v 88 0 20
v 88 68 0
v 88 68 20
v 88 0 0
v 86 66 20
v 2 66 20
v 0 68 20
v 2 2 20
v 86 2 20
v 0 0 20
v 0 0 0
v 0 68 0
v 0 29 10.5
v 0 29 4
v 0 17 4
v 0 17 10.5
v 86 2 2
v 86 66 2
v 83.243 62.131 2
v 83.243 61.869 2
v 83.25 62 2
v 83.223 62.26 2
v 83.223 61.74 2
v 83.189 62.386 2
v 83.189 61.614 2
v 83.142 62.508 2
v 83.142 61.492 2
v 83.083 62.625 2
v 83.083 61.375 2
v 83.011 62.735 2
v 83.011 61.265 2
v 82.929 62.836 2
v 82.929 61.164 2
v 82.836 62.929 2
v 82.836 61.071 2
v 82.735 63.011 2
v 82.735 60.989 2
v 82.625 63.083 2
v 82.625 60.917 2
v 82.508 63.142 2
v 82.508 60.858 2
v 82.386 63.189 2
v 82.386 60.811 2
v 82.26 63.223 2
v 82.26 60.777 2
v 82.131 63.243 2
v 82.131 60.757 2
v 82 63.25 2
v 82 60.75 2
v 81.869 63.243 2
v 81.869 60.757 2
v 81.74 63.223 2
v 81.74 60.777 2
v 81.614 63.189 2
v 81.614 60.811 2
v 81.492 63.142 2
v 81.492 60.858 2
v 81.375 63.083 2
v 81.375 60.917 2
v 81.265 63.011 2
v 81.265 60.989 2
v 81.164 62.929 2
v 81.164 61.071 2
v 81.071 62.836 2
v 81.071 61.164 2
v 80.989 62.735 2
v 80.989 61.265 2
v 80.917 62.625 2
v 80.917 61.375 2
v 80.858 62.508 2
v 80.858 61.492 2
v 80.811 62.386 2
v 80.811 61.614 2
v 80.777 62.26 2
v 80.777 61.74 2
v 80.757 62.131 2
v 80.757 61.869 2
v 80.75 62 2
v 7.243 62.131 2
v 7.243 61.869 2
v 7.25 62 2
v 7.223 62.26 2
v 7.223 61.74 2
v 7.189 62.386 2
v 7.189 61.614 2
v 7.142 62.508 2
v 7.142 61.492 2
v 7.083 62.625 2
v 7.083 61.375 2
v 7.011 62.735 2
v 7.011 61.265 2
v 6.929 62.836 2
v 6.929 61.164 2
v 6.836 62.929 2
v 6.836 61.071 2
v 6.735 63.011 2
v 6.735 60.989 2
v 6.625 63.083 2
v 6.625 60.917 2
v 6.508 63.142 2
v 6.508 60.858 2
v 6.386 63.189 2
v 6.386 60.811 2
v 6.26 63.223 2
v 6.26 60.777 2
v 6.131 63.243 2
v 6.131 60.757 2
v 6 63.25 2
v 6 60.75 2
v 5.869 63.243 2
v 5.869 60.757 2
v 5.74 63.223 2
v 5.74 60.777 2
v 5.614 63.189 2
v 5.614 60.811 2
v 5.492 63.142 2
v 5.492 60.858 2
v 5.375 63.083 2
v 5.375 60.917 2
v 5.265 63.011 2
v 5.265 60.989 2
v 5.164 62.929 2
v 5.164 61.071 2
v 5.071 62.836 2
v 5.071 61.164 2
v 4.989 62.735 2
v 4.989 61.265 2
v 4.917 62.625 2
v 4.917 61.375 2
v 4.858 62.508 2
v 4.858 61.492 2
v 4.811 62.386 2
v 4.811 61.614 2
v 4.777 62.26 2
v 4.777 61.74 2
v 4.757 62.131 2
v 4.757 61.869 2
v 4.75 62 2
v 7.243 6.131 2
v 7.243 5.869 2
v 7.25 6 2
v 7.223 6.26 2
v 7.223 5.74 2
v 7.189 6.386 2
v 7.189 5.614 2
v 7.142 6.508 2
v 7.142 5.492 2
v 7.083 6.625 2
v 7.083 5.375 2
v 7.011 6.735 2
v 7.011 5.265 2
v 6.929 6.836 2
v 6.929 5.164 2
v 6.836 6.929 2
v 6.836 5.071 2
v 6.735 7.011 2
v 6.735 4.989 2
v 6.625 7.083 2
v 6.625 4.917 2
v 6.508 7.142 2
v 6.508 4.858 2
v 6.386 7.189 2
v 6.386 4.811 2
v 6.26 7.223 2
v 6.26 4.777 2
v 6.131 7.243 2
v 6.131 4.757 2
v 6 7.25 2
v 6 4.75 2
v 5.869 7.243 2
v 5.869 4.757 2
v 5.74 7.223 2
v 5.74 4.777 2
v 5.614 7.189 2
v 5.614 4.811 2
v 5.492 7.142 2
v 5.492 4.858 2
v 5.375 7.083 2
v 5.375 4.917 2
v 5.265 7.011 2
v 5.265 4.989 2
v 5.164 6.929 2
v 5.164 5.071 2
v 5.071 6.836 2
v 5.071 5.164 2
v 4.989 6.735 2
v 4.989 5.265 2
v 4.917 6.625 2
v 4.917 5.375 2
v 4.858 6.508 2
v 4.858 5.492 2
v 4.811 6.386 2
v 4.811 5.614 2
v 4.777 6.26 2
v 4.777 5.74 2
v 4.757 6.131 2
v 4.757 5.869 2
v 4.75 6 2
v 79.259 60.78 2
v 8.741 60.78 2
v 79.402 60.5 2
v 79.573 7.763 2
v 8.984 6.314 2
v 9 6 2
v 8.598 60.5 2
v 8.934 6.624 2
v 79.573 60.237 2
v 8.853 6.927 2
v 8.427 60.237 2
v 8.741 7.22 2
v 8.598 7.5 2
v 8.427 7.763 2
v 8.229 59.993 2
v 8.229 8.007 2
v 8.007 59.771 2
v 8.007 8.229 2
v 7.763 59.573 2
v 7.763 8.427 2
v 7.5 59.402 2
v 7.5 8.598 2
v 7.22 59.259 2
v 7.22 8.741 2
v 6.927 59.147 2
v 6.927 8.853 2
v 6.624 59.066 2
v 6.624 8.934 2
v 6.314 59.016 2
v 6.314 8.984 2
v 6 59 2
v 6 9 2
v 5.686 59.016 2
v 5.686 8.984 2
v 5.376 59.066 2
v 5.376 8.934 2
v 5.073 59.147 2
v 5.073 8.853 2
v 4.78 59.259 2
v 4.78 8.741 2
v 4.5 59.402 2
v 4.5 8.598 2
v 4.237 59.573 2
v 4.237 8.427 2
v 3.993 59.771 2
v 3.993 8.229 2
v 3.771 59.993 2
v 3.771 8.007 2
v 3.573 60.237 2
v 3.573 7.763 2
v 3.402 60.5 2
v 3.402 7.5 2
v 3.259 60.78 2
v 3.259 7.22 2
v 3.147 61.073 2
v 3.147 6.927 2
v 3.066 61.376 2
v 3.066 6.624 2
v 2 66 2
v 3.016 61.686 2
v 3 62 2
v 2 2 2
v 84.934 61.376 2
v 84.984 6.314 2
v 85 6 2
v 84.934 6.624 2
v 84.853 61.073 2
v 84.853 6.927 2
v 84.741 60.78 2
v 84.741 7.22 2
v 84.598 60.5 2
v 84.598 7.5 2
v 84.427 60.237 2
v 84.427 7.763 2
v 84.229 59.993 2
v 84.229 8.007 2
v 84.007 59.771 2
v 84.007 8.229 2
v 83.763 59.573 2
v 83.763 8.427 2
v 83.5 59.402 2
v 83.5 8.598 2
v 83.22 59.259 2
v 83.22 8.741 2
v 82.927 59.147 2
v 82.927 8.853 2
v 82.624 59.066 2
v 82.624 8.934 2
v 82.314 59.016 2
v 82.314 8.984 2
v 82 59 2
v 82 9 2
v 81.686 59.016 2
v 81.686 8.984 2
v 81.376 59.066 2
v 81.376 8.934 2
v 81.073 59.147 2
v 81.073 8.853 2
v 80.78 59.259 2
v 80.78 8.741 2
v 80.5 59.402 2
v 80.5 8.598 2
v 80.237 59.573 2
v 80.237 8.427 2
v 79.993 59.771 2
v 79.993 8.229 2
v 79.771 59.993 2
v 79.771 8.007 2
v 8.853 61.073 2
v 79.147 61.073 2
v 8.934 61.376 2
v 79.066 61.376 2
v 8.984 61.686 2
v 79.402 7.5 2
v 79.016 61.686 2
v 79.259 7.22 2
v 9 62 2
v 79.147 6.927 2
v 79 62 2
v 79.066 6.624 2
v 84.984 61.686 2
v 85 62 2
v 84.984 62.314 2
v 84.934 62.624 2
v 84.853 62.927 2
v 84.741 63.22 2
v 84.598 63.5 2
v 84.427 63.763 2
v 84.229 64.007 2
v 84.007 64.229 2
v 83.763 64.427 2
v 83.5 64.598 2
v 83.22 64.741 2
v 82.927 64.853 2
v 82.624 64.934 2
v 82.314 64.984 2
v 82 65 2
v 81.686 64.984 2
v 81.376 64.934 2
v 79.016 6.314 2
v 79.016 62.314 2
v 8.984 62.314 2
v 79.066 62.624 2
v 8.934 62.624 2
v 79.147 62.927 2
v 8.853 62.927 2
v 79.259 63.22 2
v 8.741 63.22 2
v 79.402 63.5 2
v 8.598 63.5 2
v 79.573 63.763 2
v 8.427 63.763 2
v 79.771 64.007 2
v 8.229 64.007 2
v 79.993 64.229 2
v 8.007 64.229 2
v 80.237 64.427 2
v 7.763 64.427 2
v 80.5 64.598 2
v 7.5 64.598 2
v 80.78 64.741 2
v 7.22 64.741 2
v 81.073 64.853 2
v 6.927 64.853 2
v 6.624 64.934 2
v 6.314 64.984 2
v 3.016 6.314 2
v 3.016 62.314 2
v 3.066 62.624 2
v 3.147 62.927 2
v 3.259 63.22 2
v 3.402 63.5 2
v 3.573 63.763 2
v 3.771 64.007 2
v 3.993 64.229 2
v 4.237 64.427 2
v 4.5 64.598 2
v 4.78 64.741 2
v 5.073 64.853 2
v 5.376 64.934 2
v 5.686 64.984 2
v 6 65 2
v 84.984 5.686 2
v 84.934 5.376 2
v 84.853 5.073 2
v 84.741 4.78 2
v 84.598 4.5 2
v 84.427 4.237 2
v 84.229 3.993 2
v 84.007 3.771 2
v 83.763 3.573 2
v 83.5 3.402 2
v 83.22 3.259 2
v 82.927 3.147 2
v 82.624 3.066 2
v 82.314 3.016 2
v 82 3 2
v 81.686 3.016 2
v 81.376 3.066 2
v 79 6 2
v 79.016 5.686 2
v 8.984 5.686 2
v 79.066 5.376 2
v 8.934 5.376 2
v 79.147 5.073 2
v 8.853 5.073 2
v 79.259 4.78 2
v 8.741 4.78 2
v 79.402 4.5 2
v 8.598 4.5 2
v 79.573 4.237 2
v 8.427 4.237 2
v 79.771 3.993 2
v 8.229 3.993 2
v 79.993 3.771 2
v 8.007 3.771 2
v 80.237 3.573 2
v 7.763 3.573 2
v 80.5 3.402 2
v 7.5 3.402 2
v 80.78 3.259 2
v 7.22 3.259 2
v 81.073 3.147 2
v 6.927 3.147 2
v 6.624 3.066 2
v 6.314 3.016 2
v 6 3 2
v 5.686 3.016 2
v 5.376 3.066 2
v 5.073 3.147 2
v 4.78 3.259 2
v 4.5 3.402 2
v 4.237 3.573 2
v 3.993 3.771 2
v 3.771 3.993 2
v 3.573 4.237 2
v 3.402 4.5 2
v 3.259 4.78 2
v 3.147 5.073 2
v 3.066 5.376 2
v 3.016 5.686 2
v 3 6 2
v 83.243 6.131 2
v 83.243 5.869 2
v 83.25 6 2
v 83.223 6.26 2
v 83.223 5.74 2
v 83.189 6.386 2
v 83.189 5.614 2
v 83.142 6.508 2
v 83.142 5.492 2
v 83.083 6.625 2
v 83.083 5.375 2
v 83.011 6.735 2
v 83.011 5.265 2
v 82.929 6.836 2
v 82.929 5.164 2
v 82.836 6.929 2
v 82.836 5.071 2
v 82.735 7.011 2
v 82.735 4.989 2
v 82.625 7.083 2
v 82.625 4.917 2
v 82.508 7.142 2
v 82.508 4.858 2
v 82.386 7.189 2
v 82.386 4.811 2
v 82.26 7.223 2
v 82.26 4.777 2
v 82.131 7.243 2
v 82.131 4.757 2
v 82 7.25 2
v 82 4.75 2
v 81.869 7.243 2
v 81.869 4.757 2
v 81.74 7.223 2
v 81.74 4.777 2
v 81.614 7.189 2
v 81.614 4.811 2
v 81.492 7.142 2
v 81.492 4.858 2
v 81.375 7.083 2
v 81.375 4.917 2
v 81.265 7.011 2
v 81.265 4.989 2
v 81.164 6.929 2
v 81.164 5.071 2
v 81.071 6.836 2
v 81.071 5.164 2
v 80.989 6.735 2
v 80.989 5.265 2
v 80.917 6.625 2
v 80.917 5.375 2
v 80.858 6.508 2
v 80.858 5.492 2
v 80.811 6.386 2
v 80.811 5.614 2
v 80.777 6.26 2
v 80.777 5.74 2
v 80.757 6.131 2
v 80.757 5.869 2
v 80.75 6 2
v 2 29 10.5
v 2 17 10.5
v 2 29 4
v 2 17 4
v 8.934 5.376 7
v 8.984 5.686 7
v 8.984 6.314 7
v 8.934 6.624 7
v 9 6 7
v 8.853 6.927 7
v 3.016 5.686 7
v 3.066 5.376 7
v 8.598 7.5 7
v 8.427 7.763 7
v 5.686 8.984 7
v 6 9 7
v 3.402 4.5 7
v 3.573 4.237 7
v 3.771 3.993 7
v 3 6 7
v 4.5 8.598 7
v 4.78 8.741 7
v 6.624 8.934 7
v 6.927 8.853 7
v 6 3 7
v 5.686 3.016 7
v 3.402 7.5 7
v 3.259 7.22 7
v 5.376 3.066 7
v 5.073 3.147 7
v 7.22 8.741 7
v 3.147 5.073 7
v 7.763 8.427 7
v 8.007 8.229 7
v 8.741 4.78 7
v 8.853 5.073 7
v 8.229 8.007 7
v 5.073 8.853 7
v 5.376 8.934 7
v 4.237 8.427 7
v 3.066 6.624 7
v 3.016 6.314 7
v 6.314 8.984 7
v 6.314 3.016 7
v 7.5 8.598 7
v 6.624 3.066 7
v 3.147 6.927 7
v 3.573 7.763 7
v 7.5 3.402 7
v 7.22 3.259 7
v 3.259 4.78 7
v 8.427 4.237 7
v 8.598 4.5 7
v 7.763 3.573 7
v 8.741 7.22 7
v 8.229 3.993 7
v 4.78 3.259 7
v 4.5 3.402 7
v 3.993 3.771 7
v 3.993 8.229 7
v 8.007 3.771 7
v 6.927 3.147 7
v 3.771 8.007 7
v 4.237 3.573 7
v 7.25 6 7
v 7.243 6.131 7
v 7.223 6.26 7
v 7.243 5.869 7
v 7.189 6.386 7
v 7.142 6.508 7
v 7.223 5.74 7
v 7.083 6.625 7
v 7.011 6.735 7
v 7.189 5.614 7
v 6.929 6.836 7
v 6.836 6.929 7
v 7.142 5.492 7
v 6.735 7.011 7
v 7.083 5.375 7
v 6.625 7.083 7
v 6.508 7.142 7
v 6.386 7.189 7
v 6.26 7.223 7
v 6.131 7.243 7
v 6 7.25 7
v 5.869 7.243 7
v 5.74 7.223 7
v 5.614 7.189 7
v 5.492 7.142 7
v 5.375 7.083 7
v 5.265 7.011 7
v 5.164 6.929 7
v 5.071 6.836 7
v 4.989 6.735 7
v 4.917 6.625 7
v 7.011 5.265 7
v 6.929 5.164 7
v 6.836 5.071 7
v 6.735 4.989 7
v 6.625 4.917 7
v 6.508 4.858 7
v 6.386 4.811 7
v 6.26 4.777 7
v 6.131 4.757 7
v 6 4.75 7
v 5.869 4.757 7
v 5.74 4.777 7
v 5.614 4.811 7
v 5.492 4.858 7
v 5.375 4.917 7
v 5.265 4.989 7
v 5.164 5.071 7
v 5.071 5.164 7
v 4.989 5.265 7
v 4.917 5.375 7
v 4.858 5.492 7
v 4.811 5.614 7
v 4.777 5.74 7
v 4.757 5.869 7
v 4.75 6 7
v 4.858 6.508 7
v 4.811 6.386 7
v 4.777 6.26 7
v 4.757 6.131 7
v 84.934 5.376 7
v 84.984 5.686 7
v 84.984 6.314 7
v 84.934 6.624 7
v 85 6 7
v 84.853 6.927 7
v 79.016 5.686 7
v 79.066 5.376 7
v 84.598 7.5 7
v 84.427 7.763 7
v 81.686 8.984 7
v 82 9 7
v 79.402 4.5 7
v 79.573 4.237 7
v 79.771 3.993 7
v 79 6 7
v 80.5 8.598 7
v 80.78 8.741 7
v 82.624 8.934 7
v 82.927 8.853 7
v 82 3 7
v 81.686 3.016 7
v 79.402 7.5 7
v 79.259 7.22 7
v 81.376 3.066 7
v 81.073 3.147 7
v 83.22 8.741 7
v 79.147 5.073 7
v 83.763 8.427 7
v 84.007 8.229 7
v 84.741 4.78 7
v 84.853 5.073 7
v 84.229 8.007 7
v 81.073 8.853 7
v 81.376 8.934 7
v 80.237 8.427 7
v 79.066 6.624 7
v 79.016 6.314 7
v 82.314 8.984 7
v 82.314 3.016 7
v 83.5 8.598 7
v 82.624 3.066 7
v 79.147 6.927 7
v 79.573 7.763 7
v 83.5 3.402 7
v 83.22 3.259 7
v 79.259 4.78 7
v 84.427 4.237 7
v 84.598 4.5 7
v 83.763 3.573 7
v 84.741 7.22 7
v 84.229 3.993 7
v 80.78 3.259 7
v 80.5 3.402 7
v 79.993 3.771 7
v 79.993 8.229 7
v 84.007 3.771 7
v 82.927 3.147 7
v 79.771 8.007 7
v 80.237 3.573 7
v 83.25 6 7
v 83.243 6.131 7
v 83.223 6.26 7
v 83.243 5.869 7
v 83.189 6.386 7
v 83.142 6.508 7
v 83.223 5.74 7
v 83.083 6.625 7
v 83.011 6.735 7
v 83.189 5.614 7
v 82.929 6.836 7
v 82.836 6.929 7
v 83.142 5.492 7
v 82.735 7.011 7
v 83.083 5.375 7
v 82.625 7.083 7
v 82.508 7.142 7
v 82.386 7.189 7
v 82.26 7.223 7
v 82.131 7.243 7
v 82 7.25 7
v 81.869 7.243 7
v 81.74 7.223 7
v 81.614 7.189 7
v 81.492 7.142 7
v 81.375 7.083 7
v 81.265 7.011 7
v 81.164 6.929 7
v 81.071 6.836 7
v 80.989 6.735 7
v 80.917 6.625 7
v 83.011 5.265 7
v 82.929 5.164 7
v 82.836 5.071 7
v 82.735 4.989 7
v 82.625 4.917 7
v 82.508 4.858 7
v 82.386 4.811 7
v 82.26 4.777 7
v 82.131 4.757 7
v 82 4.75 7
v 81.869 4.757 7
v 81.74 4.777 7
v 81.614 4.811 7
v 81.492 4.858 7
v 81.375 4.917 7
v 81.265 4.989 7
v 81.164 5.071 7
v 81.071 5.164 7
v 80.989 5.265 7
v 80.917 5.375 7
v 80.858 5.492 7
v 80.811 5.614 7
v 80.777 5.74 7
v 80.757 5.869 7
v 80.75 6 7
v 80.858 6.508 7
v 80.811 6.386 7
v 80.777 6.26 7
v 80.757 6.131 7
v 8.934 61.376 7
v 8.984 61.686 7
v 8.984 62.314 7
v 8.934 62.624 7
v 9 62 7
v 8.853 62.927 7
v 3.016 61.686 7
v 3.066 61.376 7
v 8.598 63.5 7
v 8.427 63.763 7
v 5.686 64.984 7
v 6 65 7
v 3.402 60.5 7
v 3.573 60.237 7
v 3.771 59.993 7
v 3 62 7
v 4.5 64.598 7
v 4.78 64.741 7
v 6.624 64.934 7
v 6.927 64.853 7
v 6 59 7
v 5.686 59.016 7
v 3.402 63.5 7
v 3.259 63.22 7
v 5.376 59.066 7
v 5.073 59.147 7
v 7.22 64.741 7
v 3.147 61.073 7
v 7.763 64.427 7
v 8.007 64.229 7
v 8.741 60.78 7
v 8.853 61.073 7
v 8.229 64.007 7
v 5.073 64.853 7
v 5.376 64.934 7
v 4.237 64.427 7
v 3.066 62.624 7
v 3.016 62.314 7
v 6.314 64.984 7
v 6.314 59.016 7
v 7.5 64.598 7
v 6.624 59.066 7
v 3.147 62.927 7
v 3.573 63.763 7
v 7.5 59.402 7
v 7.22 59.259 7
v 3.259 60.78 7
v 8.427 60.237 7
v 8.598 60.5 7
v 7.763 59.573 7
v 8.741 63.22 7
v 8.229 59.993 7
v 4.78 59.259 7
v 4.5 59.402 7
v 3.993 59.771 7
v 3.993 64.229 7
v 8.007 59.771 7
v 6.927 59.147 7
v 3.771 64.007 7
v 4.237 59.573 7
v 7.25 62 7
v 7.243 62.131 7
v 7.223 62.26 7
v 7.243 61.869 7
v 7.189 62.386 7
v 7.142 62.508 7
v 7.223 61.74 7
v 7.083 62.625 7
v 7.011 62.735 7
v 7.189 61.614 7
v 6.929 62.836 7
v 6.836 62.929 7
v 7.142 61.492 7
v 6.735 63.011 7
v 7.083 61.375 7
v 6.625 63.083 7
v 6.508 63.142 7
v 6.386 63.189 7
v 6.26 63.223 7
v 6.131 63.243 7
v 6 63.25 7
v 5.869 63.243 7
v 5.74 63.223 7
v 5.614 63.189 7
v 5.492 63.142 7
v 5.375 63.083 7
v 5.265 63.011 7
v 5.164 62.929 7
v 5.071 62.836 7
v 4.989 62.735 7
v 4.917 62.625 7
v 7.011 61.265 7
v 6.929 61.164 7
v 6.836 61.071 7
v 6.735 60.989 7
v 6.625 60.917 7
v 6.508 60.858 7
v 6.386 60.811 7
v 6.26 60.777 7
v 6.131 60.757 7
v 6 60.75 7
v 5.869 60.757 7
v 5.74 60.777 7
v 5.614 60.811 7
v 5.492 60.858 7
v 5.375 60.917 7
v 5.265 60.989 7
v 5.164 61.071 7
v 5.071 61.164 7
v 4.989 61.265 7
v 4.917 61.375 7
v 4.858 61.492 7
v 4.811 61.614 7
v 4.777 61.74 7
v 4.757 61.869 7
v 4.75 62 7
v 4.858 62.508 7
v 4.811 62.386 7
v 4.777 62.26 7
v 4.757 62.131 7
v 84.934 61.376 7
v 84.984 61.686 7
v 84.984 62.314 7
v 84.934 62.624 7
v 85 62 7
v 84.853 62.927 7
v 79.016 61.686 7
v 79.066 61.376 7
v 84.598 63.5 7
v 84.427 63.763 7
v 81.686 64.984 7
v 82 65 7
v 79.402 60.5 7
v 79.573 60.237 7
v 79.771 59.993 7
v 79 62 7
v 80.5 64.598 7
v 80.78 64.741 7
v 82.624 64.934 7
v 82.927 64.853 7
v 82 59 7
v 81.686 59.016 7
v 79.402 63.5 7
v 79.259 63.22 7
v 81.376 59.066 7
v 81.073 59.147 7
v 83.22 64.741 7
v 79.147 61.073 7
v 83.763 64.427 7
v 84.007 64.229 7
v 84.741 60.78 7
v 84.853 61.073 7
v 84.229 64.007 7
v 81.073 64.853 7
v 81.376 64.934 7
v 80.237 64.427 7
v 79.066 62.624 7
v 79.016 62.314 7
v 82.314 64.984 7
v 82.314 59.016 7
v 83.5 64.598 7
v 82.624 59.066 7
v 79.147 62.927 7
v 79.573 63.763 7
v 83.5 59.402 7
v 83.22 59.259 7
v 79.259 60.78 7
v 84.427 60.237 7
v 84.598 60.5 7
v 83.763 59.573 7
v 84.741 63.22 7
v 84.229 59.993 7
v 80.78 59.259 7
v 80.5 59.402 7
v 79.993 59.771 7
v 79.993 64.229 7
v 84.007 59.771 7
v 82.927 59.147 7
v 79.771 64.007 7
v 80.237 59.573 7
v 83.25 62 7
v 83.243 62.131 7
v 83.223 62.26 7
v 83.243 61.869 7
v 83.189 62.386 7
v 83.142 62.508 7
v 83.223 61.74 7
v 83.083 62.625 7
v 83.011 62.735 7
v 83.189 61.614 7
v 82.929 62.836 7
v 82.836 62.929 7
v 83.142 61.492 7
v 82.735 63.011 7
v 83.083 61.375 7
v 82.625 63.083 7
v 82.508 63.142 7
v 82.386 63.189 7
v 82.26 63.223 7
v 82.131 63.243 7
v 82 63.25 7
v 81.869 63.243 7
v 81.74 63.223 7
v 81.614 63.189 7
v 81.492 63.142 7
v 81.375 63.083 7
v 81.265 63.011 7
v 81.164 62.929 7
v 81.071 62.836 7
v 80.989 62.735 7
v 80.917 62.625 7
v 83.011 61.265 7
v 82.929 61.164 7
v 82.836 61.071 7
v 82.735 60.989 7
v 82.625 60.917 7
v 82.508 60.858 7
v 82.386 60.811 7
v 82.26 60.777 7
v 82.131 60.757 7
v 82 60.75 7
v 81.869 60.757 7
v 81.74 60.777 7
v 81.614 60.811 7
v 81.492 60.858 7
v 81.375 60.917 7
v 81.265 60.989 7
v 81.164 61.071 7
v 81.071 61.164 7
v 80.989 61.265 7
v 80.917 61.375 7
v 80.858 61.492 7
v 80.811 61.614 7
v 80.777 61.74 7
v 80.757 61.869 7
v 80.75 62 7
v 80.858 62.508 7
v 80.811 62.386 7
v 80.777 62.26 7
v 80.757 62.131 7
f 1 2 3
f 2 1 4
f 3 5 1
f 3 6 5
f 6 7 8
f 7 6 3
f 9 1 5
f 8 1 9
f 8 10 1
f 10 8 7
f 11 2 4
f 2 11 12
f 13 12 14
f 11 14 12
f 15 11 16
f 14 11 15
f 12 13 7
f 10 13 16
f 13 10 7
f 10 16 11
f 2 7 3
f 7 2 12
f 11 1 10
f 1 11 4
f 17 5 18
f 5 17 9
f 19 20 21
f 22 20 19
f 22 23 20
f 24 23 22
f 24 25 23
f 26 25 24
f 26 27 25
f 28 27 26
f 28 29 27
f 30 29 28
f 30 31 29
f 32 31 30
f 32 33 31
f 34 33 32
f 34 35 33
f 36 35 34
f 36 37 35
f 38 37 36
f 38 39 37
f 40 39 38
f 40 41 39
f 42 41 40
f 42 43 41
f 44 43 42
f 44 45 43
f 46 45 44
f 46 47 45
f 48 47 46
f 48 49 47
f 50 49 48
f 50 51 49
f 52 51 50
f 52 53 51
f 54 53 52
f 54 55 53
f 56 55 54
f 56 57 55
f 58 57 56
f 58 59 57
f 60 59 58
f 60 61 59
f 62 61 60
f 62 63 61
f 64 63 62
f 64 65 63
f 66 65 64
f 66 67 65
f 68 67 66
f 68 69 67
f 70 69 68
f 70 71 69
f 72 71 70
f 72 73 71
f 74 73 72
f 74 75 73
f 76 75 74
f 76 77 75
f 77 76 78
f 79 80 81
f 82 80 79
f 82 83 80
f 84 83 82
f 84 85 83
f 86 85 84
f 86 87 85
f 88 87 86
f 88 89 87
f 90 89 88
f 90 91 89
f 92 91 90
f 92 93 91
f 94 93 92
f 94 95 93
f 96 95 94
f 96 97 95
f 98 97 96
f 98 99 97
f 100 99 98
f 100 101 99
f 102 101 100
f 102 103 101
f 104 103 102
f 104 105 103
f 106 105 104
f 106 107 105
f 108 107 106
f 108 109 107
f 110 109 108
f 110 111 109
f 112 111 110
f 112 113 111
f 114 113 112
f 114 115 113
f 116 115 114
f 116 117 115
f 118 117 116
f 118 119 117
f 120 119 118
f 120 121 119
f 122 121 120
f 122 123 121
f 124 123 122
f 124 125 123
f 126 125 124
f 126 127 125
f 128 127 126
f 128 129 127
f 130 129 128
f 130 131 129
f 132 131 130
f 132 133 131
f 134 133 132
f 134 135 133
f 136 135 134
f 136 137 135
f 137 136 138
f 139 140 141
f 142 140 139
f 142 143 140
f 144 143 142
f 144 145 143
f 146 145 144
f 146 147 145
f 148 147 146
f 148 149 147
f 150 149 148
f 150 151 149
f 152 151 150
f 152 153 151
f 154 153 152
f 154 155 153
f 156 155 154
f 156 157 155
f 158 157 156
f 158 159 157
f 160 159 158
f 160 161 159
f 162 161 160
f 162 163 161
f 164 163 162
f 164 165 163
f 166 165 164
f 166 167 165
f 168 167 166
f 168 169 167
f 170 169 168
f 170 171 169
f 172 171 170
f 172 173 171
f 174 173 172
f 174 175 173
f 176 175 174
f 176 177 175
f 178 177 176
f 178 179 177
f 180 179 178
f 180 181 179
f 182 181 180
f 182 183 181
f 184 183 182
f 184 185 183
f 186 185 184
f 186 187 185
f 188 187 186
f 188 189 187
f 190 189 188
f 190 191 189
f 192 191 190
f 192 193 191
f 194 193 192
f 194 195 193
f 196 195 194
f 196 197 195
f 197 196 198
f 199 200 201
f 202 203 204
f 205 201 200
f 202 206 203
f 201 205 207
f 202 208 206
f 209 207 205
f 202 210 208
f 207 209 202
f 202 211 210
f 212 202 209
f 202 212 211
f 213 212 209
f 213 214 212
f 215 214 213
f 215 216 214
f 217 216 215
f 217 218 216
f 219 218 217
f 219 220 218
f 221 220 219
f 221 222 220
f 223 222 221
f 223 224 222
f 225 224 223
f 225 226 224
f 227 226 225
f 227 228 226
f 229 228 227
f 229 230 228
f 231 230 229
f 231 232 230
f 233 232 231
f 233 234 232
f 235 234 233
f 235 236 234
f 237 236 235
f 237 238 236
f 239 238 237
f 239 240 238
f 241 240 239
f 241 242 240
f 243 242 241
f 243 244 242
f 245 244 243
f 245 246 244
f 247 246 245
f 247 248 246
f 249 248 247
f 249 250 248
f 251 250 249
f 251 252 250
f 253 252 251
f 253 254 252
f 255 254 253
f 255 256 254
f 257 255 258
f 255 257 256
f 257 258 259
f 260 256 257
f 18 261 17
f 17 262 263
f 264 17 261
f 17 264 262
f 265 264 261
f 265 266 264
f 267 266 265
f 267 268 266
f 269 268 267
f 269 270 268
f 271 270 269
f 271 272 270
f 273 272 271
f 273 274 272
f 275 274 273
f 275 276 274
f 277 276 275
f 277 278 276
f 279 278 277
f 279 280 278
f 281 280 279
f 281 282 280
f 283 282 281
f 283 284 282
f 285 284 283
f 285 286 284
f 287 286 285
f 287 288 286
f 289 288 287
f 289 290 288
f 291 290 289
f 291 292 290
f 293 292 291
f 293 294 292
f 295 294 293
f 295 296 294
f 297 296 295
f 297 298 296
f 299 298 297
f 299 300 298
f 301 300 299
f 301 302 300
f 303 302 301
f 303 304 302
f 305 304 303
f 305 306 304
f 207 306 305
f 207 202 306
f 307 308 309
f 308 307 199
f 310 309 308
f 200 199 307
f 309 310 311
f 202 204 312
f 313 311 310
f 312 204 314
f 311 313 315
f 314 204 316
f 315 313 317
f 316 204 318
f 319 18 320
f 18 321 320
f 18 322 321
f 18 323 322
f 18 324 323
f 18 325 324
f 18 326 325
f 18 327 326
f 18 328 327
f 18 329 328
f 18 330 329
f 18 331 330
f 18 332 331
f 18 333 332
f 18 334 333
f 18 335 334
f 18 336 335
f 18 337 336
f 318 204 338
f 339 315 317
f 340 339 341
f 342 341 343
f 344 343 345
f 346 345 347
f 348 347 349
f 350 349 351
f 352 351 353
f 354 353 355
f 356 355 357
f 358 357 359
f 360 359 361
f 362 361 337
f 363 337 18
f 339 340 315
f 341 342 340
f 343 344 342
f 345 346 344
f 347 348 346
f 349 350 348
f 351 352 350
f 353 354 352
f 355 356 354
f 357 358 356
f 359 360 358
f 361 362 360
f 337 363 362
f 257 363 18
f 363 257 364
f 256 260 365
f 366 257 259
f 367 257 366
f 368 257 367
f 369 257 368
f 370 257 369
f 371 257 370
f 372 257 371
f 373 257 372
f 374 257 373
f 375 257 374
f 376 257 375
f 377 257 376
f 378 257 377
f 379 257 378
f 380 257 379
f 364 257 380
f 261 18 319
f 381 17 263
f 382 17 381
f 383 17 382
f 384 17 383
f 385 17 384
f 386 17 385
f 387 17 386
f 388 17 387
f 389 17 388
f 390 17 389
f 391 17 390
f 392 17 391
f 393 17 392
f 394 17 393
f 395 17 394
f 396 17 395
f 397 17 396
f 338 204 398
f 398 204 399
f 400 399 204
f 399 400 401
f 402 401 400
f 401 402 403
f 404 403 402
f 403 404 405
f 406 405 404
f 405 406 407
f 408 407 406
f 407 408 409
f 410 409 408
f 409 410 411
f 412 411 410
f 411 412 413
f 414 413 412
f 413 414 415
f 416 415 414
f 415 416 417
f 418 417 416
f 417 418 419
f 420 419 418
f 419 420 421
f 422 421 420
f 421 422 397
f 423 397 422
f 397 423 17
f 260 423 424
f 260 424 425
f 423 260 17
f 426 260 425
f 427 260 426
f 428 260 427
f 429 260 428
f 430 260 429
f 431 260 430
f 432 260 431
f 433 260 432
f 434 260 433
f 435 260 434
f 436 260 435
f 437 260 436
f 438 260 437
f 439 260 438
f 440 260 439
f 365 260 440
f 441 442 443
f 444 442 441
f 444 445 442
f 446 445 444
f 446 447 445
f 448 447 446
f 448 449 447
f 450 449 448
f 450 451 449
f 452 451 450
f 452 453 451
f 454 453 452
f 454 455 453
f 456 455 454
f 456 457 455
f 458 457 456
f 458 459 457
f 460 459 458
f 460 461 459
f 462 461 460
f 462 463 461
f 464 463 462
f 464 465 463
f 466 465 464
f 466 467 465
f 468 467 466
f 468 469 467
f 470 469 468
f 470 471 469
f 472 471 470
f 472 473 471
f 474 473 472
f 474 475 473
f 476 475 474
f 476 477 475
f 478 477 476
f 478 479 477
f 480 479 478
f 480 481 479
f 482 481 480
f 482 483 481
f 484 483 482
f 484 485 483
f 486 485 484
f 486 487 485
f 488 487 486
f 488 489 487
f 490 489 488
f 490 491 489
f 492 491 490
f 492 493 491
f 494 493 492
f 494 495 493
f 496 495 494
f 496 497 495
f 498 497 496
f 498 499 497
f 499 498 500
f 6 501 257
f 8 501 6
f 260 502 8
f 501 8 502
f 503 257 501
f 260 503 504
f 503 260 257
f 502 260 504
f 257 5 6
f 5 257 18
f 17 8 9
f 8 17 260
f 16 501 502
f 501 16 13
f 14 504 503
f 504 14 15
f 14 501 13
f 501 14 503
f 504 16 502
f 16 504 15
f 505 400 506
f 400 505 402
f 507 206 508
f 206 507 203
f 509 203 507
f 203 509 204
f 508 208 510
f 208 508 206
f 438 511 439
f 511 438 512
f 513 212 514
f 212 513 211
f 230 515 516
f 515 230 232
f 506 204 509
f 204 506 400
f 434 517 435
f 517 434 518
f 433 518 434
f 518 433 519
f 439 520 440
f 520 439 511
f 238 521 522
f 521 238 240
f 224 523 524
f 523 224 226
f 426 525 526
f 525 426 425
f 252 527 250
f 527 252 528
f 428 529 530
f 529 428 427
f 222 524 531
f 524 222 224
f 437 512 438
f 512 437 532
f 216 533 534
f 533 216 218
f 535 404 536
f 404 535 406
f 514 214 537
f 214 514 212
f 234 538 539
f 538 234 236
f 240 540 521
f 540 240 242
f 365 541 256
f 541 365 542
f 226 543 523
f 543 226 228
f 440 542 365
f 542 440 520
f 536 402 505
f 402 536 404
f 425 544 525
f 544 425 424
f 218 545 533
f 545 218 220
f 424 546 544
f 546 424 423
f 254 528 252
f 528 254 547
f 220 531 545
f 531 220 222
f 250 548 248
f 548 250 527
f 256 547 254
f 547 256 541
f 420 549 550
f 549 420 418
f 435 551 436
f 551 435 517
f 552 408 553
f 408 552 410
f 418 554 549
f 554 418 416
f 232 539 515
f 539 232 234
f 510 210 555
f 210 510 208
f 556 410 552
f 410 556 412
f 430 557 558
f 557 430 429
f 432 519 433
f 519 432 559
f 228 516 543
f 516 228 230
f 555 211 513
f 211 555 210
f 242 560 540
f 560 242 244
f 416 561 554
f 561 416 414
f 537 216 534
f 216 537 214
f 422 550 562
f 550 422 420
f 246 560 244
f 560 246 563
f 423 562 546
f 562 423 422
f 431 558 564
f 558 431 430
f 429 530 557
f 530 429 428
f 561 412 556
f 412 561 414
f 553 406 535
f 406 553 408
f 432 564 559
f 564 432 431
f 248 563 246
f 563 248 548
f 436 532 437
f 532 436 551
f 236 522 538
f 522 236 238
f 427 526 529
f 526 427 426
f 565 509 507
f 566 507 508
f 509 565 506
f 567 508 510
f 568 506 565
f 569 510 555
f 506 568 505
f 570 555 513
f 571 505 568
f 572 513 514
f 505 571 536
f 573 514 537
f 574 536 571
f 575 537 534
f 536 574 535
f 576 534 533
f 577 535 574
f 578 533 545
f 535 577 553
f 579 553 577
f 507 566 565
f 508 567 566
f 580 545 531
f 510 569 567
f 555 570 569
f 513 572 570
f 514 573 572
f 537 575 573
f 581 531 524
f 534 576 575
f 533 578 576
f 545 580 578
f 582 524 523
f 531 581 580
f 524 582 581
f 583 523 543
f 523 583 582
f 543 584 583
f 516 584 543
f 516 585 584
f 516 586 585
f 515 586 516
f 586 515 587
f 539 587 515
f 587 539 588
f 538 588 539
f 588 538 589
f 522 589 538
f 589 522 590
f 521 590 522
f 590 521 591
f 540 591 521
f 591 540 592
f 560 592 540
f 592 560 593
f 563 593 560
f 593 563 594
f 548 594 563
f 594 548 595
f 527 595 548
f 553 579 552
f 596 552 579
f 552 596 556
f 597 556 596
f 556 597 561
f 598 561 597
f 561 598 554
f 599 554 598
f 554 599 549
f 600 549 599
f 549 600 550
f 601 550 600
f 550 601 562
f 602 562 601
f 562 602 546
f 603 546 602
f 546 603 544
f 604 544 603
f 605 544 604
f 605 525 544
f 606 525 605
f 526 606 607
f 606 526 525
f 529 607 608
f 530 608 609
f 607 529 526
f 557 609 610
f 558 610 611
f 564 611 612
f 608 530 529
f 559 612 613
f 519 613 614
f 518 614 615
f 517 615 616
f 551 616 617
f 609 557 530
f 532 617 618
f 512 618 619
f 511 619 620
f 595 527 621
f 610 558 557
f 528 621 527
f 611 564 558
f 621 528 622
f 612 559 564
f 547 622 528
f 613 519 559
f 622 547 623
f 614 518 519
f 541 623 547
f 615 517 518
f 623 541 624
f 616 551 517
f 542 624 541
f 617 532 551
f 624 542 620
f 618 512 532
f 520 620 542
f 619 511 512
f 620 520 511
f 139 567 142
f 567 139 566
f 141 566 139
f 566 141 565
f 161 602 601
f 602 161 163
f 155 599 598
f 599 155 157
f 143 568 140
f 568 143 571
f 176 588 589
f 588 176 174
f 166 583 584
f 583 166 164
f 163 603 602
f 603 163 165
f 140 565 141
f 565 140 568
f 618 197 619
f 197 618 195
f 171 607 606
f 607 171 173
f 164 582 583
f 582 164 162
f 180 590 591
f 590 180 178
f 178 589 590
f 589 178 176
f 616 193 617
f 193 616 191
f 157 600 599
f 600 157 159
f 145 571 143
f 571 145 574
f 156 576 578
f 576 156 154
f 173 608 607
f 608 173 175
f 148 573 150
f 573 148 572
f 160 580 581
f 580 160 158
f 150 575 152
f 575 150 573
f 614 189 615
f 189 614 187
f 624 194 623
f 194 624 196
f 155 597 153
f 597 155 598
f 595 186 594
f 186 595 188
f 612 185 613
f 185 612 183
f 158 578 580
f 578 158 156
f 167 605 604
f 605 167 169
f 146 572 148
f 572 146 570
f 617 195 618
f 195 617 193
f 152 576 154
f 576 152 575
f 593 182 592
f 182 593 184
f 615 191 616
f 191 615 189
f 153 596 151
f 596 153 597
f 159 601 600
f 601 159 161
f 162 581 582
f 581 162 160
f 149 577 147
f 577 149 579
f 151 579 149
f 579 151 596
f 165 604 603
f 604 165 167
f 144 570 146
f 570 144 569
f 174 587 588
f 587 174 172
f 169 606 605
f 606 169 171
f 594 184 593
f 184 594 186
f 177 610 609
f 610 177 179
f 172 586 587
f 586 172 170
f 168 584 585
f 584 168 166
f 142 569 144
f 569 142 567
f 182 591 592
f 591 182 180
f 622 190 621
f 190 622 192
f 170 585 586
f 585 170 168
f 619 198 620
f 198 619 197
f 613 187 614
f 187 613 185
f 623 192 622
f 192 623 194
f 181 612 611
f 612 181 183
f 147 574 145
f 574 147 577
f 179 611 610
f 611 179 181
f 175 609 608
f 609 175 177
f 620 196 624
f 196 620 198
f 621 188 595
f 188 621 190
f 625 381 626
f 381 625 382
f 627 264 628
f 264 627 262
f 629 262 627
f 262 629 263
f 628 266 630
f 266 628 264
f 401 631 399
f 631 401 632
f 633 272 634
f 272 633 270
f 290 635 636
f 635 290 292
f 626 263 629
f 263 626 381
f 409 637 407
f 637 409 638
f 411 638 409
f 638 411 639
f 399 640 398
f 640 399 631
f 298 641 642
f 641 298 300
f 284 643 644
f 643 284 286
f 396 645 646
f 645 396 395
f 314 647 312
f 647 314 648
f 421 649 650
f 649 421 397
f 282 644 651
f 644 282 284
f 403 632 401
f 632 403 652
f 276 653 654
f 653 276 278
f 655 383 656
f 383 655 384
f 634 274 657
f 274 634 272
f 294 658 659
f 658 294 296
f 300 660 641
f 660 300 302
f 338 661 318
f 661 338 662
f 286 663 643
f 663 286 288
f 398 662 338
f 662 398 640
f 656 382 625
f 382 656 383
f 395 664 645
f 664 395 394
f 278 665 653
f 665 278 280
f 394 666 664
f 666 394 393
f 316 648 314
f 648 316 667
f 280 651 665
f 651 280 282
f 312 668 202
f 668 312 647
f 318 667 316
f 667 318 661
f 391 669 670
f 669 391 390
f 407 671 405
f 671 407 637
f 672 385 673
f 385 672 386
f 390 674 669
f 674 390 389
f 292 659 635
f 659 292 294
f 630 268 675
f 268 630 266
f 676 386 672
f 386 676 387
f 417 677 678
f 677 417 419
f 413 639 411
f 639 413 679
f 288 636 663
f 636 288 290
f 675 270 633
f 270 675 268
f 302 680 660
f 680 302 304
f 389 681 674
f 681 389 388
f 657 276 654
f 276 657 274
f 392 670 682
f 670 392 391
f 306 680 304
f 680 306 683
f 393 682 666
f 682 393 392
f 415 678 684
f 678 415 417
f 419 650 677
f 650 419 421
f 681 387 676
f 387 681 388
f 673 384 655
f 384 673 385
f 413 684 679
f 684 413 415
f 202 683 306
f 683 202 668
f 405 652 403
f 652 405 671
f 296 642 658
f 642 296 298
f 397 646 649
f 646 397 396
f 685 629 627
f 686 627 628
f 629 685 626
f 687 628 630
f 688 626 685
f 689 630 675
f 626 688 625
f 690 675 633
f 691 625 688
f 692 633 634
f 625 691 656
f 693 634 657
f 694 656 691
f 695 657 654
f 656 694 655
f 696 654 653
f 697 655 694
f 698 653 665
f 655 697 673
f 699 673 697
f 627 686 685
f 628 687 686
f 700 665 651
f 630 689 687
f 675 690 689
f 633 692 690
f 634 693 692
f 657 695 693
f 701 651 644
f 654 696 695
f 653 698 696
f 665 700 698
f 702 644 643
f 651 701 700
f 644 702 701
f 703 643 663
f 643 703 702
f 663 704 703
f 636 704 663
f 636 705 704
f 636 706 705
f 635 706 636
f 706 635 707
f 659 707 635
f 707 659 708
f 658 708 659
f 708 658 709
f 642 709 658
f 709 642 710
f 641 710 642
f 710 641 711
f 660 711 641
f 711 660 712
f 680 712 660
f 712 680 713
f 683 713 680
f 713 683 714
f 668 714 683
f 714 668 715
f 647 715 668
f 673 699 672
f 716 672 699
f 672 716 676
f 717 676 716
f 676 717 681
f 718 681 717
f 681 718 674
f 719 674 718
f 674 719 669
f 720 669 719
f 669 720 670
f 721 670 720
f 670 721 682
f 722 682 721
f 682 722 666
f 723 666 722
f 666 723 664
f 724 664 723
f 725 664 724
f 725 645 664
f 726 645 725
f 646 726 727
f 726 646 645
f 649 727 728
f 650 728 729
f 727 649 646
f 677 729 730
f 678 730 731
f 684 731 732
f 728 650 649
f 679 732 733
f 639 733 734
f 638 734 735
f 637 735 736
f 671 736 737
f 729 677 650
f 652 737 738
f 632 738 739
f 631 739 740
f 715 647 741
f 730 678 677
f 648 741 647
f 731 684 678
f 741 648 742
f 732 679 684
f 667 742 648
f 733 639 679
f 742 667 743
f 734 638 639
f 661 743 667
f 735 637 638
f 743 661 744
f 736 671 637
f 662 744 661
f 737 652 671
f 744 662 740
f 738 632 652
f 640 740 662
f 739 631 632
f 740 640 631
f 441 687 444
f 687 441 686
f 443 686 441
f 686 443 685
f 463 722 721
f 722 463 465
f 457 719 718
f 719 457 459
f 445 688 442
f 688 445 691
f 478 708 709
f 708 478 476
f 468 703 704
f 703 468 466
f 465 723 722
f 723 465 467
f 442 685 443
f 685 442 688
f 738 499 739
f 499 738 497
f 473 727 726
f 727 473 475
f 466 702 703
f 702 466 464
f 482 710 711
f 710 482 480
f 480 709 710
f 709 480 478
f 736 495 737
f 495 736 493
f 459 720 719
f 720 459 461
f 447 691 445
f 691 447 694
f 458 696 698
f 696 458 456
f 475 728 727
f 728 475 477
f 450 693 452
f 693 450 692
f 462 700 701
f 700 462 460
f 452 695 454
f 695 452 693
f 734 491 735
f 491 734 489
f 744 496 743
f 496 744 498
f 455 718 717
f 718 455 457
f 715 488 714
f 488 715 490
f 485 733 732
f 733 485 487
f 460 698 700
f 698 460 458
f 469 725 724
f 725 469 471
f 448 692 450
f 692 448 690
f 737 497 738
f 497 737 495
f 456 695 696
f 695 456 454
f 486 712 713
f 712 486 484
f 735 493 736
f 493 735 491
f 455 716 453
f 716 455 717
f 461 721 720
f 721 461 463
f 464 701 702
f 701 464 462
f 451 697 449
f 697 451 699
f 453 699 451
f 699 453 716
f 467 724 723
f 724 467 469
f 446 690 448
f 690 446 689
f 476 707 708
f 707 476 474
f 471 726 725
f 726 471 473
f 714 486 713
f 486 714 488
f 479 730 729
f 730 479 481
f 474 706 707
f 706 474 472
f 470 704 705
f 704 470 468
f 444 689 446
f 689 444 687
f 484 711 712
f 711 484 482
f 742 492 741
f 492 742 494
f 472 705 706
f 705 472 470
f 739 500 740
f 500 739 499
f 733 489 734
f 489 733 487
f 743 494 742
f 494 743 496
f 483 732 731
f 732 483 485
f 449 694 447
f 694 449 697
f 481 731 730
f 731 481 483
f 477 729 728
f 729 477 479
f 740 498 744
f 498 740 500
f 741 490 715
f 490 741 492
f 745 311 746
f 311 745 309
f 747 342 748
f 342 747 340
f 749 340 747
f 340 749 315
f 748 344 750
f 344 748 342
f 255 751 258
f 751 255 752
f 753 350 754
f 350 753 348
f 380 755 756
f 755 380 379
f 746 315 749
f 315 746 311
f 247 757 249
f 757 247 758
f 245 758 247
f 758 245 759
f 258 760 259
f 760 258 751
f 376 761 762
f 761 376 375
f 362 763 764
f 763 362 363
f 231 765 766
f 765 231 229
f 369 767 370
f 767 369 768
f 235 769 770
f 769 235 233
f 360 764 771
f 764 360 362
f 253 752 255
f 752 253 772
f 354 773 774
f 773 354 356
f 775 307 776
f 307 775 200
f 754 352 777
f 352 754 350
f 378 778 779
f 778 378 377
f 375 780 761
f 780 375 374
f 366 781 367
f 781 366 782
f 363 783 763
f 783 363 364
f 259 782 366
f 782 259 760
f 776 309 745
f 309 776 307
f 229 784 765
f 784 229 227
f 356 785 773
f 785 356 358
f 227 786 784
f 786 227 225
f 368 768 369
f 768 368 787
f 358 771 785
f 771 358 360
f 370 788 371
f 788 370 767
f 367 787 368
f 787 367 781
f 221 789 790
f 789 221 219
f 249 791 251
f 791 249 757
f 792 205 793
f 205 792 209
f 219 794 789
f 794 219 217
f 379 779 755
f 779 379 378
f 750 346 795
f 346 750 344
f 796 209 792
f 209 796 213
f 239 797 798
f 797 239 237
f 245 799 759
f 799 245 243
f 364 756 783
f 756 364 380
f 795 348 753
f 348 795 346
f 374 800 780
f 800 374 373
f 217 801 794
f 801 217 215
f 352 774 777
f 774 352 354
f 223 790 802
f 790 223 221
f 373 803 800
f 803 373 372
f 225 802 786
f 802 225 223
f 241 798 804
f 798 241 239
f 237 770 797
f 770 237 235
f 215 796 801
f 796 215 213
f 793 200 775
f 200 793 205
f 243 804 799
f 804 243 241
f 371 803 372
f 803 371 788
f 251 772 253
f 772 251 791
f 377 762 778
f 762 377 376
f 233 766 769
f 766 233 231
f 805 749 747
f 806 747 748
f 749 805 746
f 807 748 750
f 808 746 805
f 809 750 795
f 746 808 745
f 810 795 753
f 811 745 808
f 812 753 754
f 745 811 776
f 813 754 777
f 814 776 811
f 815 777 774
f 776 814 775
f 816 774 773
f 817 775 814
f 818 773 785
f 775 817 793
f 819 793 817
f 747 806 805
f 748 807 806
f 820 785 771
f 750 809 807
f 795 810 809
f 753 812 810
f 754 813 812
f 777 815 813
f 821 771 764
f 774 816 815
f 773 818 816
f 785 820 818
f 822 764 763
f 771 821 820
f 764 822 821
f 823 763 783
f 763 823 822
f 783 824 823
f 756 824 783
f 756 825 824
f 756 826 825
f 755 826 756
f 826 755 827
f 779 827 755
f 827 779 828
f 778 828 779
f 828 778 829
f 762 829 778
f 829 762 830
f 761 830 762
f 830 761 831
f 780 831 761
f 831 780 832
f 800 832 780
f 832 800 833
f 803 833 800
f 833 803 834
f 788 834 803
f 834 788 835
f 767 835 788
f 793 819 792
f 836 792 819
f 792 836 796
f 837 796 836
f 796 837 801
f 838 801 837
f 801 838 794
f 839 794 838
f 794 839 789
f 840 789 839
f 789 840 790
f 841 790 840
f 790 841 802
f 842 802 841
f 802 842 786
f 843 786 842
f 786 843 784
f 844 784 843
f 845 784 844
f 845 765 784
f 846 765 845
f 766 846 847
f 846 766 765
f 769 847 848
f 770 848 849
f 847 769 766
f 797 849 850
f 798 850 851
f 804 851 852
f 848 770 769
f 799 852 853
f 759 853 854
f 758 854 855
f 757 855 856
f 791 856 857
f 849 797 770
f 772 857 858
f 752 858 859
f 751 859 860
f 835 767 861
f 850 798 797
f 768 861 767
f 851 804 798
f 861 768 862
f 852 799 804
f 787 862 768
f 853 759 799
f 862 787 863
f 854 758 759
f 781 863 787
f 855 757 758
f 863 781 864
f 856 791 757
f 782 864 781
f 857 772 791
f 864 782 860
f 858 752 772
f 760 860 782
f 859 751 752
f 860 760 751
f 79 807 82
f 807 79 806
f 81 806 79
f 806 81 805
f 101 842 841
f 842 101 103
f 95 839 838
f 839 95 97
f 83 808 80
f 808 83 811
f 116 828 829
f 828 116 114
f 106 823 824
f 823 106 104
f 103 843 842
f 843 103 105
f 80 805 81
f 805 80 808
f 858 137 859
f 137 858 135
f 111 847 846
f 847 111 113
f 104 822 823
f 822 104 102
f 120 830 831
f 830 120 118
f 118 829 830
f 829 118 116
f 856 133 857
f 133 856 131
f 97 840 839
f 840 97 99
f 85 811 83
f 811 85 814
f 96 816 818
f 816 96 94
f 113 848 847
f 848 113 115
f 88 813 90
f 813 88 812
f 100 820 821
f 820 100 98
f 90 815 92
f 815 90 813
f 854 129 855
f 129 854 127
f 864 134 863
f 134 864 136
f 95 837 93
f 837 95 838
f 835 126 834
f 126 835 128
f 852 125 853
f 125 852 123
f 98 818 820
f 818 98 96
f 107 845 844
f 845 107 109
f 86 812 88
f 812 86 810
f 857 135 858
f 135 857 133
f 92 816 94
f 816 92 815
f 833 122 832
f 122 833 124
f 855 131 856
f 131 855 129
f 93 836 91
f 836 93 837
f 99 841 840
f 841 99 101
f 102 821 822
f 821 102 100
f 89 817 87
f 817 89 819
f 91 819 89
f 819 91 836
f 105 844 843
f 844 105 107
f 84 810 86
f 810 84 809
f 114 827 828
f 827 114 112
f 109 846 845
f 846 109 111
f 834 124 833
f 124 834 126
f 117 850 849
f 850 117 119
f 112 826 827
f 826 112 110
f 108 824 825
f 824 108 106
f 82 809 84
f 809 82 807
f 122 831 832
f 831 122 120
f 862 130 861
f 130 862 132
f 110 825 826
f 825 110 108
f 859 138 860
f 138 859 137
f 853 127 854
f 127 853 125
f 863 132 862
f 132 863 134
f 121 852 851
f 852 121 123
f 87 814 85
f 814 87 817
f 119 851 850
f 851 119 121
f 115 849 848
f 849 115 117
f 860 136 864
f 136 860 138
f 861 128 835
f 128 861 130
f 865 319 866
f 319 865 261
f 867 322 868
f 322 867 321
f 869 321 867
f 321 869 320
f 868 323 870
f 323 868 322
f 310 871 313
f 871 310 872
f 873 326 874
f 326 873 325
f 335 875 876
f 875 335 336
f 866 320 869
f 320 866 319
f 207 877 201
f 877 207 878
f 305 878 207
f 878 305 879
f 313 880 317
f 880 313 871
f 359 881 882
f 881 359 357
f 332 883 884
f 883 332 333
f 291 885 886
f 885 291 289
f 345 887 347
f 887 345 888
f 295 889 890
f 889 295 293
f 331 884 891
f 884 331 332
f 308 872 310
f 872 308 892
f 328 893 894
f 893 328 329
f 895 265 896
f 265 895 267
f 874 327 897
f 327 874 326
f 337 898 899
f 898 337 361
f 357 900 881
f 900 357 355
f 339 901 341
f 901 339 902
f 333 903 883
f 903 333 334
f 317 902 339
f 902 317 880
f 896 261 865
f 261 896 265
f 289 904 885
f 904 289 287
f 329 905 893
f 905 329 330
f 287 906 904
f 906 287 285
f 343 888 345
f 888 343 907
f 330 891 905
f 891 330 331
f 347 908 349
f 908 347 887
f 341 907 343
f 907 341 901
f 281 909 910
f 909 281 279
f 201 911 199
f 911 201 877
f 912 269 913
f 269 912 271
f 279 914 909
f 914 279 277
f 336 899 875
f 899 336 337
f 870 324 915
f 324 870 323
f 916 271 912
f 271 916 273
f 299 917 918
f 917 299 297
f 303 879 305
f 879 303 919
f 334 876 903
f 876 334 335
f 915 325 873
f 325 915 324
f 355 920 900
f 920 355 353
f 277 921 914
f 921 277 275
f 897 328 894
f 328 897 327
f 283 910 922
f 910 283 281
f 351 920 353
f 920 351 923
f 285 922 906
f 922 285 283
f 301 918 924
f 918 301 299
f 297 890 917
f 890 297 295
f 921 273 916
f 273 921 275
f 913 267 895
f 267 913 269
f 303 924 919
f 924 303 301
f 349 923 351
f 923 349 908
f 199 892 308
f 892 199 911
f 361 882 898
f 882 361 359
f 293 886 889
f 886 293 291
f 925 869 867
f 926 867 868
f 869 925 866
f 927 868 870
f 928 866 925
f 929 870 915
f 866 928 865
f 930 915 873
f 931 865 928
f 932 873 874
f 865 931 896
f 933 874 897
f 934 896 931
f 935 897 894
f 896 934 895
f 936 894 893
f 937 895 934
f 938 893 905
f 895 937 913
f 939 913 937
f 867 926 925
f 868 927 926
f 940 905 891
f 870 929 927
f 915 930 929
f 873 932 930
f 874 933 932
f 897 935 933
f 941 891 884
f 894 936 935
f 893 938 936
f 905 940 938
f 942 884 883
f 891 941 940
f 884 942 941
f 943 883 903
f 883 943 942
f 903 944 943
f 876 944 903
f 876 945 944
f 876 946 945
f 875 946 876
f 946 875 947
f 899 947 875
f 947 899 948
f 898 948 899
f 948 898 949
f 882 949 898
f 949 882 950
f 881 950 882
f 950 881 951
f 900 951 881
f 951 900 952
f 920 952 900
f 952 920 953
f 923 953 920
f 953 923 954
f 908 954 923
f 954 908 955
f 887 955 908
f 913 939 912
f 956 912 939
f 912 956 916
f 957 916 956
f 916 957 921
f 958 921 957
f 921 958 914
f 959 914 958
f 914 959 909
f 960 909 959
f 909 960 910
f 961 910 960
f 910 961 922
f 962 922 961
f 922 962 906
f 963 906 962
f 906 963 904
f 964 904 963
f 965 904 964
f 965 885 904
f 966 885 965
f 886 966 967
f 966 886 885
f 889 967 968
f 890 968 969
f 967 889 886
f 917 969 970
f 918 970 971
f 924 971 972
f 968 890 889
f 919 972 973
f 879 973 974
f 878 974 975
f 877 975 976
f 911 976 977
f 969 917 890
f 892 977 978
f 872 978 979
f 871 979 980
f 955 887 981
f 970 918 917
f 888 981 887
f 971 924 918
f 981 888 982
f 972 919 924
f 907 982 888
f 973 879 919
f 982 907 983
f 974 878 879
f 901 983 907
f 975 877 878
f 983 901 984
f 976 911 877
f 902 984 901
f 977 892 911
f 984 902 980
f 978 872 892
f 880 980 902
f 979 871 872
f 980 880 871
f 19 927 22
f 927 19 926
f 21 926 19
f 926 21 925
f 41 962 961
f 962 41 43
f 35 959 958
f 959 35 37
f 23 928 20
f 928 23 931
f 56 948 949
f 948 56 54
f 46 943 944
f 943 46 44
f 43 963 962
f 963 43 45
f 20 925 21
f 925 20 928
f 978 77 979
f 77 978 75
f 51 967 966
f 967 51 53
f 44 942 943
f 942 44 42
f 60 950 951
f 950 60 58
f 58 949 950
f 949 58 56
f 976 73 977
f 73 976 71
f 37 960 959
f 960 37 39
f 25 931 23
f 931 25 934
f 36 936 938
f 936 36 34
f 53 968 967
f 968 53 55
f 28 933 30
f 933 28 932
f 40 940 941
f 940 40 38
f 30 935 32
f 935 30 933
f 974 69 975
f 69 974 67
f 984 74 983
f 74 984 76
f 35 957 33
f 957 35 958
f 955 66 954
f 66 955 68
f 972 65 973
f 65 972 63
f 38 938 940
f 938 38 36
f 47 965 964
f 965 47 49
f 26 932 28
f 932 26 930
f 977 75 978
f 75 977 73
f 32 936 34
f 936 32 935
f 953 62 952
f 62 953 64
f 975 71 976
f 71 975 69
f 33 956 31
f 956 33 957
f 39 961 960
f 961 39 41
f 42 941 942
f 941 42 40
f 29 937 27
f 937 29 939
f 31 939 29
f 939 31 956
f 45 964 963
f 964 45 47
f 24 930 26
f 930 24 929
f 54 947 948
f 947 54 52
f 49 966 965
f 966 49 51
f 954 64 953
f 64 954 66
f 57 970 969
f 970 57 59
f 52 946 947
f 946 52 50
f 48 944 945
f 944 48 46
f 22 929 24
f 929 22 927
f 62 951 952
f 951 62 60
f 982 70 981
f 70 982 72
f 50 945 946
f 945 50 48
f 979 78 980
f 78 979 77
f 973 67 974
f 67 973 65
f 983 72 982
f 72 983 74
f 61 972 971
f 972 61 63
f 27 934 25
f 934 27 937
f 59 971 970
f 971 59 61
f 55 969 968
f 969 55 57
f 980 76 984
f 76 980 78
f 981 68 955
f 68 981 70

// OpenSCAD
// SpecterSense Handheld Radar Enclosure
// Parametric OpenSCAD Source for ESP32-S3 + mmWave Radar Carrier

$fn = 60;

// Board Dimensions
board_length = 84;
board_width  = 64;
board_height = 20;
wall_thickness = 2.0;

// Main Enclosure Base Body
module enclosure_base() {
    difference() {
        // Outer Shell
        cube([board_length + (wall_thickness * 2), board_width + (wall_thickness * 2), board_height], center = false);
        
        // Inner Cavity
        translate([wall_thickness, wall_thickness, wall_thickness])
            cube([board_length, board_width, board_height], center = false);
            
        // USB-C Cutout for ESP32-S3
        translate([-1, wall_thickness + 15, wall_thickness + 2])
            cube([wall_thickness + 2, 12, 6.5]);
    }
    
    // M2.5 Mounting Stand-offs
    standoff(wall_thickness + 4, wall_thickness + 4);
    standoff(wall_thickness + board_length - 4, wall_thickness + 4);
    standoff(wall_thickness + 4, wall_thickness + board_width - 4);
    standoff(wall_thickness + board_length - 4, wall_thickness + board_width - 4);
}

module standoff(x, y) {
    translate([x, y, wall_thickness])
    difference() {
        cylinder(r = 3.0, h = 5);
        cylinder(r = 1.25, h = 6); // M2.5 screw tap hole
    }
}

enclosure_base();
